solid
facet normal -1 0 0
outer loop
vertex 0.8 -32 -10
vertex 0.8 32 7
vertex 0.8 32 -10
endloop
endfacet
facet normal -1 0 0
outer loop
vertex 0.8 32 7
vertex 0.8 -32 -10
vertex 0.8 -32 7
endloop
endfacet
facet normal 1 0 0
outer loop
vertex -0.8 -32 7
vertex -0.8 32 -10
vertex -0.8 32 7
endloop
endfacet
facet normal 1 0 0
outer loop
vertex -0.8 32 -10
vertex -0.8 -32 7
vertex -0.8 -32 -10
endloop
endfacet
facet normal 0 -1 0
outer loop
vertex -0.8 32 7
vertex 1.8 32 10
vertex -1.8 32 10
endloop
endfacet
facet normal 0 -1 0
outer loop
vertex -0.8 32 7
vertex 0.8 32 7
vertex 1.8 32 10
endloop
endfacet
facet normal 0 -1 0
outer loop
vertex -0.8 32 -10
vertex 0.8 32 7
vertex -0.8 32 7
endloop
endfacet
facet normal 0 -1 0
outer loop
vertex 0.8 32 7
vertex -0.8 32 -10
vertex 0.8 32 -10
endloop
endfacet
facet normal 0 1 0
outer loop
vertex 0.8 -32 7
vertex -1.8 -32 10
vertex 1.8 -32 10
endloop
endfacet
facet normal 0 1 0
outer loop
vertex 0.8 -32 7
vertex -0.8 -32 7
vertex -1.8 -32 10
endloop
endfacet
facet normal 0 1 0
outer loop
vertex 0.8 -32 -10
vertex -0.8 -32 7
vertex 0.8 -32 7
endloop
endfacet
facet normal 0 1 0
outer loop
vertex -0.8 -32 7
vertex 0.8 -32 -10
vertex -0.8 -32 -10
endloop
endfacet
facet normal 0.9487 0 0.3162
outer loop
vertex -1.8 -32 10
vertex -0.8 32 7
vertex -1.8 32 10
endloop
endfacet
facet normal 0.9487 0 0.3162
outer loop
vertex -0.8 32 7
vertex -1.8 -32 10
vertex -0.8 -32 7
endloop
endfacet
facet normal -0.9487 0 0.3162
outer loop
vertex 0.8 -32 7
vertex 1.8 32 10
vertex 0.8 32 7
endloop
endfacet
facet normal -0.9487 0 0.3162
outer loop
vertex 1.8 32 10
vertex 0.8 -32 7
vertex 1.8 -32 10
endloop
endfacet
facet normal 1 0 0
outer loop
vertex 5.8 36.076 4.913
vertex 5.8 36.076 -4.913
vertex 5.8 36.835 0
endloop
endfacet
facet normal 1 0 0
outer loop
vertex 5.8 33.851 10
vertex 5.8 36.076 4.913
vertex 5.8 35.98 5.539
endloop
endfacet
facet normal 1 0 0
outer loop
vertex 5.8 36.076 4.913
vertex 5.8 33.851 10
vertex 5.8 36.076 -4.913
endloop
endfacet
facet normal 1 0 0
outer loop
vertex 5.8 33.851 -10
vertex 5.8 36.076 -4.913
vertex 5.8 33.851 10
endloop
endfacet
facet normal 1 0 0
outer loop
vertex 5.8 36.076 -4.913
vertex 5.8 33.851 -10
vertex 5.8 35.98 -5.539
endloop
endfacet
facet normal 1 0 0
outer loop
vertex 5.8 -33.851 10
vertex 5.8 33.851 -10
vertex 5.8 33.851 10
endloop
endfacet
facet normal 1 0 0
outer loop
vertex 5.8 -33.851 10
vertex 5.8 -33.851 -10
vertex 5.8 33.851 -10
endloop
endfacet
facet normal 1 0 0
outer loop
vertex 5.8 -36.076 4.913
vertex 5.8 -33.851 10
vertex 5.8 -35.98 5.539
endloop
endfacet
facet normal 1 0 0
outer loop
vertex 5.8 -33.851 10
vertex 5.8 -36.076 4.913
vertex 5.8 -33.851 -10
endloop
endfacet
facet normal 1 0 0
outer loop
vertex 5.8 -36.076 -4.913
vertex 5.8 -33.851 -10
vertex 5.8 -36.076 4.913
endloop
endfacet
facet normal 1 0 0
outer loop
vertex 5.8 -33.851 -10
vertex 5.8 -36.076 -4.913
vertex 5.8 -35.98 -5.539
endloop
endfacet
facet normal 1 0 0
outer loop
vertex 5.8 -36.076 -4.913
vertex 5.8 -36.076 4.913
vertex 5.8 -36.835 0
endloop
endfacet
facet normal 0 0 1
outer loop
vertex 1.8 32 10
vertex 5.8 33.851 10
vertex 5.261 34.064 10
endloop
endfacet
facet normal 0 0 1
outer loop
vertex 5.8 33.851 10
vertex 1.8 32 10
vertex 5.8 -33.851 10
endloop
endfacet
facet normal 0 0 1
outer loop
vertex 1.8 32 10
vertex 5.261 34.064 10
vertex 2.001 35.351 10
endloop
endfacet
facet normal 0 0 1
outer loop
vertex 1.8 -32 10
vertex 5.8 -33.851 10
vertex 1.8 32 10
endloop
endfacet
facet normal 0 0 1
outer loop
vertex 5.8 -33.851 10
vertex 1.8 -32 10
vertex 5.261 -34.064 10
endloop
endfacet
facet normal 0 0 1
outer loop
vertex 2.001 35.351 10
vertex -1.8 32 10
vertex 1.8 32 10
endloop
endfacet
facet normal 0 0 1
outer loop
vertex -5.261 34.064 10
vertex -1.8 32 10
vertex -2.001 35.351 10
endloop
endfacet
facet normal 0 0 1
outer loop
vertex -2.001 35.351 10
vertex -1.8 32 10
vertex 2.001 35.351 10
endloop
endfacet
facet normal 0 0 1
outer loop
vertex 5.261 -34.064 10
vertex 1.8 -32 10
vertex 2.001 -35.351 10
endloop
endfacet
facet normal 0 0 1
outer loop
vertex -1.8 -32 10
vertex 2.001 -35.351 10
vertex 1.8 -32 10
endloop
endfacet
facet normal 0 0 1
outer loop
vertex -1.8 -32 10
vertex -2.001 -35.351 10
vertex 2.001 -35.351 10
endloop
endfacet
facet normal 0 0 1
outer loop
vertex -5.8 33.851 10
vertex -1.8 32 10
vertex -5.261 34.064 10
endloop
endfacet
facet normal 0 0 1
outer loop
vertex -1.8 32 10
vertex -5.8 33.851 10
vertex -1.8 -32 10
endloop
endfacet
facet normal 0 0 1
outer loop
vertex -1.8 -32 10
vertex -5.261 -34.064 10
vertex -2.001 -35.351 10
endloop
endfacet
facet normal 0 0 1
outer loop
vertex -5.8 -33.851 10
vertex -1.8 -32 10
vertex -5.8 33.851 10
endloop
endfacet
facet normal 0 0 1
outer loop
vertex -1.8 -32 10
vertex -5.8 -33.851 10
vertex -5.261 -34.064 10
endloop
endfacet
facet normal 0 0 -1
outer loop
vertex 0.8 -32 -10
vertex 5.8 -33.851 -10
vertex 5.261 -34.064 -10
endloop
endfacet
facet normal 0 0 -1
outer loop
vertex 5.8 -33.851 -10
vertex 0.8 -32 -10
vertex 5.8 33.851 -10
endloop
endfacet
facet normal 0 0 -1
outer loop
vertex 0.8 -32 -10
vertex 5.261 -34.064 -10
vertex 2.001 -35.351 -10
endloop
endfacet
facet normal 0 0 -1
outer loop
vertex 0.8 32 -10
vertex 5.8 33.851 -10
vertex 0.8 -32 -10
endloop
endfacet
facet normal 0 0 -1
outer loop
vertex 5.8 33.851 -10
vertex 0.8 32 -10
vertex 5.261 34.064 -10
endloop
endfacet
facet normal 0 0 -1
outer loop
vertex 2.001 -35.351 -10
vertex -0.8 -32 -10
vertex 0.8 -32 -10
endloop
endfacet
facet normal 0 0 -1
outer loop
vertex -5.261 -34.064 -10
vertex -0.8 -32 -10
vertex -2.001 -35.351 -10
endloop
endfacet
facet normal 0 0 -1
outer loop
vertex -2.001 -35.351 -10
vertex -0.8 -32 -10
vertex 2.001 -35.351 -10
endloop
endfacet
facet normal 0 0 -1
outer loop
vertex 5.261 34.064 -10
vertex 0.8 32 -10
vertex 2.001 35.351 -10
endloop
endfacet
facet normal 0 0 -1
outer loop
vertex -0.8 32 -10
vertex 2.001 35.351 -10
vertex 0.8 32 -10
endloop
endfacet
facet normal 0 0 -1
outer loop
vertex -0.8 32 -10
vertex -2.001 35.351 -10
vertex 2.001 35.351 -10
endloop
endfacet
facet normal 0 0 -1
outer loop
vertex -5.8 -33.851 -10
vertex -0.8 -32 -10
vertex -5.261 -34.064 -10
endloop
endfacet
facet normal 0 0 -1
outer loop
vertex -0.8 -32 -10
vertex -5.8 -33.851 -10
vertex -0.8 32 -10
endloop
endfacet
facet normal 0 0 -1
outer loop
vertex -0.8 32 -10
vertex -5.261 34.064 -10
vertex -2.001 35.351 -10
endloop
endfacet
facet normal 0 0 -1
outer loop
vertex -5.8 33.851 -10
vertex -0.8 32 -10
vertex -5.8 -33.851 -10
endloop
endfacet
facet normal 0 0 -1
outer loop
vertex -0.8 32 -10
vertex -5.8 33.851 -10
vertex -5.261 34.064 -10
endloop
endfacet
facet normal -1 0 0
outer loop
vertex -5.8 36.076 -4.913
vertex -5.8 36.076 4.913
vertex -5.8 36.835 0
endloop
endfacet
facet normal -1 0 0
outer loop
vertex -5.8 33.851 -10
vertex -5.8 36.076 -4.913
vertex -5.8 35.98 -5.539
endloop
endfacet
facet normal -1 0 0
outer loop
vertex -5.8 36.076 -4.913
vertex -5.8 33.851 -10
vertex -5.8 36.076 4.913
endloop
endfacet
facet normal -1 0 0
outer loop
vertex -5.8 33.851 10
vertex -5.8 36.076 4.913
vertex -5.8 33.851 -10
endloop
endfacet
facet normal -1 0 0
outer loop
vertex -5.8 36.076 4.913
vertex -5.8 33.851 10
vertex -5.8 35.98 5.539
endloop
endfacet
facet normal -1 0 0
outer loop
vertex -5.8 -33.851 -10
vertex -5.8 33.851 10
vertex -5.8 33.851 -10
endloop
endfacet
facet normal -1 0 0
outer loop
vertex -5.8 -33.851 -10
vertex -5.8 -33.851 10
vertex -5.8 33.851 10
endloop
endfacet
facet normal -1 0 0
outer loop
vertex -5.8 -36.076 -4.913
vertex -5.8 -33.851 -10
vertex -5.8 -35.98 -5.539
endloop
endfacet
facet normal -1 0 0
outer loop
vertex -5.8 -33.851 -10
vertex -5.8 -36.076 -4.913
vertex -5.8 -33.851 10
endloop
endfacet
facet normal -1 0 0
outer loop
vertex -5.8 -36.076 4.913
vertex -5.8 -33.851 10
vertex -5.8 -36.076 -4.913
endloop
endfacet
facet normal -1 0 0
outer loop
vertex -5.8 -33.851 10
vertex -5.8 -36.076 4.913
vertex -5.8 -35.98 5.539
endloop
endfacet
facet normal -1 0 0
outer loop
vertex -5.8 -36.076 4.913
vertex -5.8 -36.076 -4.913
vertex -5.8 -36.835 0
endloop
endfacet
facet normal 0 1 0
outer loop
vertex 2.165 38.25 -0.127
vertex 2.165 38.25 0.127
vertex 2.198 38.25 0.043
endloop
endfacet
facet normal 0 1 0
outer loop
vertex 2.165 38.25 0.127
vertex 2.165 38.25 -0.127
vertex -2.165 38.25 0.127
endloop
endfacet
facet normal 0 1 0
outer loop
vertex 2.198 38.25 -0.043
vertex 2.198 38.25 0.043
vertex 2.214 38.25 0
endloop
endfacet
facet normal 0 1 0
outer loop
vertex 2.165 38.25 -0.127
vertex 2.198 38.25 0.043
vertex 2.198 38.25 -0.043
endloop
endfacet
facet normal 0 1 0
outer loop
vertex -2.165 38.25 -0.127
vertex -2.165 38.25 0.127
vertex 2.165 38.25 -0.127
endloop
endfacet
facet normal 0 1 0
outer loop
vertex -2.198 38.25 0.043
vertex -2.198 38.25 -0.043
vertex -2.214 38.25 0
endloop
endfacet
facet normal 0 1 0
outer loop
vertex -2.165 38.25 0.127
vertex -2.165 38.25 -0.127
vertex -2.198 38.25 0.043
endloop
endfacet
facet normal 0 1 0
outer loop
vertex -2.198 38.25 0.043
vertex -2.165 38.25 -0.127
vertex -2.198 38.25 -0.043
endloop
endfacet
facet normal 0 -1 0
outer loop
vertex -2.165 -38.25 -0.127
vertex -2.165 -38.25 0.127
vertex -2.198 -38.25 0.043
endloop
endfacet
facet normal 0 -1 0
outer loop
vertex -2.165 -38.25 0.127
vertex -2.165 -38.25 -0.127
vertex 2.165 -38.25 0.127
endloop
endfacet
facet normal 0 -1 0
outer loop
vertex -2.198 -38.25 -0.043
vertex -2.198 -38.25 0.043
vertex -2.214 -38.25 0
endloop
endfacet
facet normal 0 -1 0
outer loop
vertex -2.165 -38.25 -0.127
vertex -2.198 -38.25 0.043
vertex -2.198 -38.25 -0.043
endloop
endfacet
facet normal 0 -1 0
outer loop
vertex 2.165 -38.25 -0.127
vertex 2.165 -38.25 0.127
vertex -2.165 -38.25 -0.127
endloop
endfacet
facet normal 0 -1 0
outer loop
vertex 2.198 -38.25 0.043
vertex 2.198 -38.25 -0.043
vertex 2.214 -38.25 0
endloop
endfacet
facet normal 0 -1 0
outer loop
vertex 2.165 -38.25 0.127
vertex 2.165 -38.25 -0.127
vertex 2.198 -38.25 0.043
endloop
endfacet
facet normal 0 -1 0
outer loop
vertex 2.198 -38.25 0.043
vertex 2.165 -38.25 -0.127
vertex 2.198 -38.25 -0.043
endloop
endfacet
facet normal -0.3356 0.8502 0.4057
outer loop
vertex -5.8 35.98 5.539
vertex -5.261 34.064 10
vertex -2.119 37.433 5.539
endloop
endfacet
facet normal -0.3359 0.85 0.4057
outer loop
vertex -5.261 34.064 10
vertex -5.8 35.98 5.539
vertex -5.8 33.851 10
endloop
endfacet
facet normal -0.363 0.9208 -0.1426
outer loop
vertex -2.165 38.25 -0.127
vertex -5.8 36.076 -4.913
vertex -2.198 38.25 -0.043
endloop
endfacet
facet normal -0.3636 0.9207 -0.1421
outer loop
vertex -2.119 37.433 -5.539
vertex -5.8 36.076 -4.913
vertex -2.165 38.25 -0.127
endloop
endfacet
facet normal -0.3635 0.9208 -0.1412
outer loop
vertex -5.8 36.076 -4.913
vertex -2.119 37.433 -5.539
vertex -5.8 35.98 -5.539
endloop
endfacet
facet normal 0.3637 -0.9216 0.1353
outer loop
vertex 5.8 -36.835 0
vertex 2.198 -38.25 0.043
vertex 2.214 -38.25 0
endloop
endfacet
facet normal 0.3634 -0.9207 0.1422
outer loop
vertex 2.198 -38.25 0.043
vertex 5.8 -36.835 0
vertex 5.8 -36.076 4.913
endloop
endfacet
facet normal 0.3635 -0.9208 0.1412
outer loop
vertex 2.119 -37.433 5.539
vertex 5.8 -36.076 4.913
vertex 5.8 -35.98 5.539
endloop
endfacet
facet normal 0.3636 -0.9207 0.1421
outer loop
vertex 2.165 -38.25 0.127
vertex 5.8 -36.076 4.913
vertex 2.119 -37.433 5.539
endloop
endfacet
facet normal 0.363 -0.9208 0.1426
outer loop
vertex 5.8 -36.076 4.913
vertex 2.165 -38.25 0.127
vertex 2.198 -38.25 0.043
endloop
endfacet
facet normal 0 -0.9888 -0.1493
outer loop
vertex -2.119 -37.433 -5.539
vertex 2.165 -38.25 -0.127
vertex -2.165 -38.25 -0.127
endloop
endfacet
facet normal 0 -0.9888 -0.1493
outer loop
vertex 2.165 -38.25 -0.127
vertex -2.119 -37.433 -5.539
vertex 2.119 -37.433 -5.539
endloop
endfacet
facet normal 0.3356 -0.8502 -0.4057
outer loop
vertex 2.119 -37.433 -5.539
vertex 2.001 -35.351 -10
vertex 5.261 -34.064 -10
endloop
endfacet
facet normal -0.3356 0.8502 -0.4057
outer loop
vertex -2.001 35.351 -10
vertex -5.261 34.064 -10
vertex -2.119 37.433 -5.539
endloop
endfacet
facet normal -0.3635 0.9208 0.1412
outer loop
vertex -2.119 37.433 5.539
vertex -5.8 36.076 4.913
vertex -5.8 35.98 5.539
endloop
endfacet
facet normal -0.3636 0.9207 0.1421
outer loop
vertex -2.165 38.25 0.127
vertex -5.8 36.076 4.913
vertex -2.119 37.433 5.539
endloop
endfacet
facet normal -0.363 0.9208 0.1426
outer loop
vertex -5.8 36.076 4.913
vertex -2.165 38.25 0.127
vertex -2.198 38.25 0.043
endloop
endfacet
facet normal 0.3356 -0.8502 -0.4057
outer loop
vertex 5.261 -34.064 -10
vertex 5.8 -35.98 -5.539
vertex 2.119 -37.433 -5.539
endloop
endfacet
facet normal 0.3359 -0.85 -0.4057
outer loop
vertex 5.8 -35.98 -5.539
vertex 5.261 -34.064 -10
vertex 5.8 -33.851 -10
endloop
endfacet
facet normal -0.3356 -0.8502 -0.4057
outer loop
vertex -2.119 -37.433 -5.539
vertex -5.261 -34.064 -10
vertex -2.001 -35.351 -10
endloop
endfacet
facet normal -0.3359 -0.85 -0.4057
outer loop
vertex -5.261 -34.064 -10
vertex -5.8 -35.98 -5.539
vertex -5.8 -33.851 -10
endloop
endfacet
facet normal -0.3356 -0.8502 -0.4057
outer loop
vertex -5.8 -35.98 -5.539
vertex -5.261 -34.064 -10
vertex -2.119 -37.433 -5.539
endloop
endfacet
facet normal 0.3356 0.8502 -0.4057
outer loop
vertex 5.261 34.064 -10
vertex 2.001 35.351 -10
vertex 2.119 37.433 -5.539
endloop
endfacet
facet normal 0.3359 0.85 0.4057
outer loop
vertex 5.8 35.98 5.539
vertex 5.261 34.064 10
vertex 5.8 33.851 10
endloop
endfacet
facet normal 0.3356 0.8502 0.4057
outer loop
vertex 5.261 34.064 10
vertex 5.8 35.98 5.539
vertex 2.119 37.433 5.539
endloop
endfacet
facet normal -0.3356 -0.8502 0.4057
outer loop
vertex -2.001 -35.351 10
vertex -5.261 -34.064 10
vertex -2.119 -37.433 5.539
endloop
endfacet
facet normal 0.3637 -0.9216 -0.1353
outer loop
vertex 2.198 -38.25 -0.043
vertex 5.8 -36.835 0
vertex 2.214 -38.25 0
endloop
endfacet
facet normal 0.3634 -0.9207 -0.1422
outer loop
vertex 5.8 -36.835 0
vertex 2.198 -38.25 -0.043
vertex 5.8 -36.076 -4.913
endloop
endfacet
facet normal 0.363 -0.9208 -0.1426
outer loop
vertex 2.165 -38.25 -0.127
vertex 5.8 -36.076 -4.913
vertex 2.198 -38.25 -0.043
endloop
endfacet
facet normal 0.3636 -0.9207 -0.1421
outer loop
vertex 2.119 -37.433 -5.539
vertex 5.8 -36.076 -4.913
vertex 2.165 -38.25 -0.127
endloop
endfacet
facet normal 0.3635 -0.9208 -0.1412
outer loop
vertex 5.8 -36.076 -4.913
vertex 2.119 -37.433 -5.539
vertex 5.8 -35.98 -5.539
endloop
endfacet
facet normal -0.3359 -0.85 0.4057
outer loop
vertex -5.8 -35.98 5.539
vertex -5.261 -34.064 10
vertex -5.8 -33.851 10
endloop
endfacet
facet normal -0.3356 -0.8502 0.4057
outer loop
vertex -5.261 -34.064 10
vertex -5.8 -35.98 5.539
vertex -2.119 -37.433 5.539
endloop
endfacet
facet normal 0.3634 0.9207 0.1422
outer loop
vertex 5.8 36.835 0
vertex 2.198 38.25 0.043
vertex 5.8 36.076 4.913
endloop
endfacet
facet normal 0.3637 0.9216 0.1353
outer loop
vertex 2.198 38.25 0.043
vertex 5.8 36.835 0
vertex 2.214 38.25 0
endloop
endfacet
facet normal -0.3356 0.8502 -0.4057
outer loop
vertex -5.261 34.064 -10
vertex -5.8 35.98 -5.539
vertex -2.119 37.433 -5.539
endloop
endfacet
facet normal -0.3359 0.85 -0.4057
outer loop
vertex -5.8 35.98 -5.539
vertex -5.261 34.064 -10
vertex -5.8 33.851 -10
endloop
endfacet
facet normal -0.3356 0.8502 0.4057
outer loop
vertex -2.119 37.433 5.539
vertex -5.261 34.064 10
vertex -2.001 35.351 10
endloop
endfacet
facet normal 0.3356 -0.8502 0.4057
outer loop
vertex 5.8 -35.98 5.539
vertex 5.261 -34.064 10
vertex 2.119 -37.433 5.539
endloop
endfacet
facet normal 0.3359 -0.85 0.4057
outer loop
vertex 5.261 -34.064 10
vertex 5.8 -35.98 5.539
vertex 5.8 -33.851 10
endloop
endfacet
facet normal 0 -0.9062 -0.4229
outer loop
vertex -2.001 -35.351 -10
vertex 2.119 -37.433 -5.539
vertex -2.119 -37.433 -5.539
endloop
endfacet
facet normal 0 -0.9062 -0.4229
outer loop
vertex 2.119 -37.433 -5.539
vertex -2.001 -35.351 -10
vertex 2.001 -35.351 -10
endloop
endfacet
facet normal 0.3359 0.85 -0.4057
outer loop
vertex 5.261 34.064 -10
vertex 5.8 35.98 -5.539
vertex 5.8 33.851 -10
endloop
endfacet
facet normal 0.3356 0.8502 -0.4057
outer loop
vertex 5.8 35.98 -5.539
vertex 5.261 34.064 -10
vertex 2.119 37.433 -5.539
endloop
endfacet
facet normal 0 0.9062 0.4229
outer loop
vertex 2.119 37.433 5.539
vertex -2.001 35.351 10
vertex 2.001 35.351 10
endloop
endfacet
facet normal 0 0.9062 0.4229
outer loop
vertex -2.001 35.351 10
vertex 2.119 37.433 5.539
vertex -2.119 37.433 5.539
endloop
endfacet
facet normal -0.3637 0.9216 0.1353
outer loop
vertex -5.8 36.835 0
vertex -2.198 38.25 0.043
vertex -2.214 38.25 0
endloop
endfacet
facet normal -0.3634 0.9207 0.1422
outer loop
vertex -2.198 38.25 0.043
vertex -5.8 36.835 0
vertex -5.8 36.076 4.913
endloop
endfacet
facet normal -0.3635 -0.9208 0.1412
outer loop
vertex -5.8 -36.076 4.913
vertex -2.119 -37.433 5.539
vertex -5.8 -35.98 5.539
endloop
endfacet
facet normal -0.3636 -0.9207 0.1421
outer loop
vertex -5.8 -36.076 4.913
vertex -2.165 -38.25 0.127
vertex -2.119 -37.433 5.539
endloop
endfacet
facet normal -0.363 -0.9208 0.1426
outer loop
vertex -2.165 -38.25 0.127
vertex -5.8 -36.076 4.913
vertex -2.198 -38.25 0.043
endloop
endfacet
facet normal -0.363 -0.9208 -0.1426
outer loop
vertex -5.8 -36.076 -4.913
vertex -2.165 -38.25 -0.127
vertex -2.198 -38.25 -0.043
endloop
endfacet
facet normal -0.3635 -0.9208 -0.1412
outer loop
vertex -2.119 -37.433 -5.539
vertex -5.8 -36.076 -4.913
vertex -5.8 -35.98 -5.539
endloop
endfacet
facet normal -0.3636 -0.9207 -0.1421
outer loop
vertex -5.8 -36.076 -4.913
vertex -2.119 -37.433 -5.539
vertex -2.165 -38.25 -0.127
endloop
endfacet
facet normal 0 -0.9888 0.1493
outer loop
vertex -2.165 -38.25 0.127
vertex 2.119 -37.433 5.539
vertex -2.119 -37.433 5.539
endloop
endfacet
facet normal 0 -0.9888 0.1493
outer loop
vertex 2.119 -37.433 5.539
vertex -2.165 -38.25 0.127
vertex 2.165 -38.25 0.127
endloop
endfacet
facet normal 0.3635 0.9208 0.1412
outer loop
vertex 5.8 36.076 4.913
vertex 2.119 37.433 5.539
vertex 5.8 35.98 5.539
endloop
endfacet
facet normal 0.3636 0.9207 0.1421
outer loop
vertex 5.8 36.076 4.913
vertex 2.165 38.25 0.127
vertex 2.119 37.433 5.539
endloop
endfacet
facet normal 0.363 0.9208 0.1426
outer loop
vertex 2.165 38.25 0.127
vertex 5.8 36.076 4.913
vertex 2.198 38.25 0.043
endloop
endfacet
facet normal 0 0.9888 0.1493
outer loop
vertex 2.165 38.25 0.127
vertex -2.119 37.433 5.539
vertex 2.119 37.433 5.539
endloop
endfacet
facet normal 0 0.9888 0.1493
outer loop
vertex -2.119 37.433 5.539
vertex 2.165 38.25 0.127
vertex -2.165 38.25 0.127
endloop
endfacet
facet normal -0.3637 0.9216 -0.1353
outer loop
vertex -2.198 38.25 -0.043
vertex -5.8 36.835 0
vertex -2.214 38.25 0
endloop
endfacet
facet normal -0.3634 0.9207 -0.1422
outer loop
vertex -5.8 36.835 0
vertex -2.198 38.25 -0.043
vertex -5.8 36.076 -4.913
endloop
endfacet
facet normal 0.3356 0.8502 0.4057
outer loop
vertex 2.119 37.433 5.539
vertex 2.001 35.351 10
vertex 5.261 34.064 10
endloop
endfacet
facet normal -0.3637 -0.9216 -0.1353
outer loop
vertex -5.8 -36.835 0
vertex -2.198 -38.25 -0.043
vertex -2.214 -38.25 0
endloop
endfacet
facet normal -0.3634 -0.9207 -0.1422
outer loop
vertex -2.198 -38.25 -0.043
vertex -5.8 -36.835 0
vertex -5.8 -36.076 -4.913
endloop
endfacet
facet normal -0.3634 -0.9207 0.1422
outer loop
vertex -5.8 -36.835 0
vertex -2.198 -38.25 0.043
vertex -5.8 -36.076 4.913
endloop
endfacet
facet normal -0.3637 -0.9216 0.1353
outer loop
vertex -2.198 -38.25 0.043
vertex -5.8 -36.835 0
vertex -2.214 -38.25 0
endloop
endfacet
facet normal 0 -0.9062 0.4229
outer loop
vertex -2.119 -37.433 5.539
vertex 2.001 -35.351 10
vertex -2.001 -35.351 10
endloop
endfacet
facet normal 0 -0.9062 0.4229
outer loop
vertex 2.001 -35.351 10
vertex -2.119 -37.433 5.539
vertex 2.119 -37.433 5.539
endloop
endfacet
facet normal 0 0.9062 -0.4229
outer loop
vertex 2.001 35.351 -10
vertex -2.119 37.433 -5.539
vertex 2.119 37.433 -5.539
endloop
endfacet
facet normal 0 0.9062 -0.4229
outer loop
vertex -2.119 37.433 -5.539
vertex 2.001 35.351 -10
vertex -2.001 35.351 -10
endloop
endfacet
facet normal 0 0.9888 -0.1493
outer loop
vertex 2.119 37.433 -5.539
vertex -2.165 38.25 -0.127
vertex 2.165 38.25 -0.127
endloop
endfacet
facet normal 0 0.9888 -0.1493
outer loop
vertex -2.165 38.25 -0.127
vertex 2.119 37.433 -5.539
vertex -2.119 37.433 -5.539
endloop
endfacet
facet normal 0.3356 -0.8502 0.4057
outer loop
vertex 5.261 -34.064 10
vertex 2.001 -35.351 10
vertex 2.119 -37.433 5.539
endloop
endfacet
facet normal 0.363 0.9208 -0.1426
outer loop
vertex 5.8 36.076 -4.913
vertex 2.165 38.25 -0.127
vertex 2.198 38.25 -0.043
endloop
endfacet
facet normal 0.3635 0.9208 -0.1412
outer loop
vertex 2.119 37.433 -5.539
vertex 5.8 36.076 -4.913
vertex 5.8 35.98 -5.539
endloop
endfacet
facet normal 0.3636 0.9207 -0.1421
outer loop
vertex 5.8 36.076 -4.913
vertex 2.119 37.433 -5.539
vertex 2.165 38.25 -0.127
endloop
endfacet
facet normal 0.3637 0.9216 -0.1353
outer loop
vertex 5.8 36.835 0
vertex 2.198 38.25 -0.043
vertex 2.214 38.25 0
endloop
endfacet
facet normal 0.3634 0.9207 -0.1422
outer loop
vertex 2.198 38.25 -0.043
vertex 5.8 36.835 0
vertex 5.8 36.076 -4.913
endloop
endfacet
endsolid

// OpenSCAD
// PARAMETRIC TUBE SQUEEZER by Coasterman
// Liscensed under Attribution-Creative Commons.
// (c) 2011 by Coasterman.

use <OpenScadFont.scad>;

// VARIABLES
tube_thickness = 1.6;	// Thickness of opening
tube_width = 64;	// Width of opening
squeezer_width = 5;	// Width of walls of squeezer
squeezer_height = 20;	// Height of squeezer
roundness = 0.80; // 1 for rectangular, lower numbers are rounder

tube_inc=2;
tube_inc_inset=3;

EPS=0.1;


intersection() {
  difference() {
    cube([tube_thickness + squeezer_width*2, tube_width + squeezer_width*2/roundness, squeezer_height], true);
    union() {
      translate([0,0,-tube_inc_inset])
    		cube([tube_thickness, tube_width, squeezer_height+EPS], true);
      hull() {
        translate([0,0,squeezer_height/2-tube_inc_inset/2])
    		cube([tube_thickness, tube_width, tube_inc_inset], true);
	    translate([0,0,squeezer_height]) 
      		cube([tube_thickness+tube_inc, tube_width, squeezer_height], center=true);
      }
    } 
  }
  scale(v=[roundness, roundness, roundness]) {
    scale(v=[0.35, 0.65, 0.45]) {
      sphere(tube_width + squeezer_width*2);
    }
  }
}

translate([squeezer_width+tube_thickness-1,-27,0]) rotate(90,[0,1,0])
scale([1.5,1.4,1]) {
    fnt_str(["D", "a", "u", "m"],4,2,1);
    translate([0, 8*2.5+1.5,0])
    fnt_str(["o", "o", "s", "e", "r"],5,2,1);
}
